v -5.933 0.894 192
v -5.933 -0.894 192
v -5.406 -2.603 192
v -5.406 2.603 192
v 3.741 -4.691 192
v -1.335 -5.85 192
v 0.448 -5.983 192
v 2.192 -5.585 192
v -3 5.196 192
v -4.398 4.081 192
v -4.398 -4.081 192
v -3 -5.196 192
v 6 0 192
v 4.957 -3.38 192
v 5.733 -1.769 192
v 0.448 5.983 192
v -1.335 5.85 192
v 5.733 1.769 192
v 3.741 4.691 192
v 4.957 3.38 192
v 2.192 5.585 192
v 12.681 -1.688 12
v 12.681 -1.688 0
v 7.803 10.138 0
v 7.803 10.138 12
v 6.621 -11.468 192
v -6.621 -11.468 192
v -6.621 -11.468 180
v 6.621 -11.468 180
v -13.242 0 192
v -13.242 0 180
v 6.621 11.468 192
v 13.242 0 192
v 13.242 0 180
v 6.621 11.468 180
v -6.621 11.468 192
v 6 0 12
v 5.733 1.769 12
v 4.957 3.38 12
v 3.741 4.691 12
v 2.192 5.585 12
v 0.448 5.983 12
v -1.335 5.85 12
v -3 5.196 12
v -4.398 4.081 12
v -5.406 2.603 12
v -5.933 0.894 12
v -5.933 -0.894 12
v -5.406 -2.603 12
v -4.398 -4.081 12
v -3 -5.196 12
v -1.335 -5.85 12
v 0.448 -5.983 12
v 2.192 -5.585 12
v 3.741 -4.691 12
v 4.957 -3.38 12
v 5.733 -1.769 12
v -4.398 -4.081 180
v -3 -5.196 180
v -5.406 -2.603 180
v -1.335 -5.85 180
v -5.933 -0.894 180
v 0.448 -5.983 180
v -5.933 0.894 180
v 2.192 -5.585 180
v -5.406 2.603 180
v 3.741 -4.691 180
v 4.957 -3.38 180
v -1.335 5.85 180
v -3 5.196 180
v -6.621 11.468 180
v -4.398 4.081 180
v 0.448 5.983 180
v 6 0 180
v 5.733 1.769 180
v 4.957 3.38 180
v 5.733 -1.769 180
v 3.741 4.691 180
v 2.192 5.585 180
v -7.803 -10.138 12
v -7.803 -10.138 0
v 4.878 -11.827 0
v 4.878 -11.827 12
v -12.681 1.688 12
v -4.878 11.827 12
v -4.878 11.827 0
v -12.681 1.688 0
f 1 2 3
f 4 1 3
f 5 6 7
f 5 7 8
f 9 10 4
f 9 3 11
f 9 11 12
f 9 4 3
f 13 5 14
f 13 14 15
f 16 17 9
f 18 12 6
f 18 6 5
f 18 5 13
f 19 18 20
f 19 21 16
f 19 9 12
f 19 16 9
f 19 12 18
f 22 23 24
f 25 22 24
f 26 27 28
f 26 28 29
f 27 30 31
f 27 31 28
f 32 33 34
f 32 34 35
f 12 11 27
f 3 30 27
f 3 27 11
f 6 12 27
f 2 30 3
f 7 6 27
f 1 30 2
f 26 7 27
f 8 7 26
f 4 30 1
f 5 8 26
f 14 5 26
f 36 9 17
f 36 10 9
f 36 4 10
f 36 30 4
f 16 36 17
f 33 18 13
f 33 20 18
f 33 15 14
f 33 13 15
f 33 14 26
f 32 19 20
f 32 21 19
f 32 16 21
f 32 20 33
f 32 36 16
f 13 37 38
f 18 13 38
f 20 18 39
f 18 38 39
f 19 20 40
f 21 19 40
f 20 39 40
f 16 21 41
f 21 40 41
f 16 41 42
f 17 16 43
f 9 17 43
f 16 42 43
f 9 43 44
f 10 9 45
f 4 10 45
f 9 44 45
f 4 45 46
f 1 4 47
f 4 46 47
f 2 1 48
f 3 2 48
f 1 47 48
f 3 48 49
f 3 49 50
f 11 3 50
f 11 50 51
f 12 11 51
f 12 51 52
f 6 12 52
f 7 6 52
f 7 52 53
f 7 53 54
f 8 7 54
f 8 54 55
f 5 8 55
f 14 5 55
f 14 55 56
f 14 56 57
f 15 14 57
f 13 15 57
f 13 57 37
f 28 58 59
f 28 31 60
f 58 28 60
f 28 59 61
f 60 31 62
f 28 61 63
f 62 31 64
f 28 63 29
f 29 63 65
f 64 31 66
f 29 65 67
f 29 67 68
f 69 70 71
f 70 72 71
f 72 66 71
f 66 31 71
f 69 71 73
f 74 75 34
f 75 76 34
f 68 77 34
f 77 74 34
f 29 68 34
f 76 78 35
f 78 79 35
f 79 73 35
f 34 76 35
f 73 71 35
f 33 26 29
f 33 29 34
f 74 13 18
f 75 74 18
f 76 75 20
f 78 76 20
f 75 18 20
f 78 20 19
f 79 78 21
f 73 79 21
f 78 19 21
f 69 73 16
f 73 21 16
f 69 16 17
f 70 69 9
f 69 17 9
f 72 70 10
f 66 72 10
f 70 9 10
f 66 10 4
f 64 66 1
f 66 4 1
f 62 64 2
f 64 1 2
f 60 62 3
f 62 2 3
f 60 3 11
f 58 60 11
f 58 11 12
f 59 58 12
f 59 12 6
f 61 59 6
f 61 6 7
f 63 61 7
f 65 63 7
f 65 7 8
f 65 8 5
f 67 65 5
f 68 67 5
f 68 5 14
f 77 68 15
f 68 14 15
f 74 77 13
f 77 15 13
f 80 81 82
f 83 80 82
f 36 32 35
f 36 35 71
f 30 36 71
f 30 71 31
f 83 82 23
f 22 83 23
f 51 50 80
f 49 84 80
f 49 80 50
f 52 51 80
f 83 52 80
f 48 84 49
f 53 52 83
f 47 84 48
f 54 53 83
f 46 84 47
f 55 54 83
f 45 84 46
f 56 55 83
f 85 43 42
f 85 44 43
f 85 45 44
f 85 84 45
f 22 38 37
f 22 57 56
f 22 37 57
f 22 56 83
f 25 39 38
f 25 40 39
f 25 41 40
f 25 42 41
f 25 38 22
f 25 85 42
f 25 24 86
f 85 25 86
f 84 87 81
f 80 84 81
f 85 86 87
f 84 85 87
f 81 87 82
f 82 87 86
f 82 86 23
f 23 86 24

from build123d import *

# Parameters (mm, degrees)
F0_R     = 6
F1_DEPTH = 192
F2_DEPTH = 12
F3_R     = 6
F4_DEPTH = 12


with BuildPart() as f1:
    # F0 (on Top) → F1 (new body)
    with BuildSketch(Plane.XY):
        Circle(F0_R)
    extrude(amount=F1_DEPTH)

    # F0 (on Top) → F2 (join)
    with BuildSketch(Plane.XY):
        Polygon((-4.8783502823, 11.8265430801), (-12.6812618875, 1.688496267), (-7.8029116052, -10.1380468131), (4.8783502823, -11.8265430801), (12.6812618875, -1.688496267), (7.8029116052, 10.1380468131), align=None)
        Circle(F0_R, mode=Mode.SUBTRACT)
    extrude(amount=F2_DEPTH)


with BuildPart() as f4:
    # F3 (on face) → F4 (new body)
    with BuildSketch(Plane.XY.offset(192)):
        Polygon((-6.621212456, -11.4682763815), (6.621212456, -11.4682763815), (13.242424912, 0), (6.621212456, 11.4682763815), (-6.621212456, 11.4682763815), (-13.242424912, 0), align=None)
        Circle(F3_R, mode=Mode.SUBTRACT)
    extrude(amount=-F4_DEPTH)


solid = Compound([f1.part, f4.part])
